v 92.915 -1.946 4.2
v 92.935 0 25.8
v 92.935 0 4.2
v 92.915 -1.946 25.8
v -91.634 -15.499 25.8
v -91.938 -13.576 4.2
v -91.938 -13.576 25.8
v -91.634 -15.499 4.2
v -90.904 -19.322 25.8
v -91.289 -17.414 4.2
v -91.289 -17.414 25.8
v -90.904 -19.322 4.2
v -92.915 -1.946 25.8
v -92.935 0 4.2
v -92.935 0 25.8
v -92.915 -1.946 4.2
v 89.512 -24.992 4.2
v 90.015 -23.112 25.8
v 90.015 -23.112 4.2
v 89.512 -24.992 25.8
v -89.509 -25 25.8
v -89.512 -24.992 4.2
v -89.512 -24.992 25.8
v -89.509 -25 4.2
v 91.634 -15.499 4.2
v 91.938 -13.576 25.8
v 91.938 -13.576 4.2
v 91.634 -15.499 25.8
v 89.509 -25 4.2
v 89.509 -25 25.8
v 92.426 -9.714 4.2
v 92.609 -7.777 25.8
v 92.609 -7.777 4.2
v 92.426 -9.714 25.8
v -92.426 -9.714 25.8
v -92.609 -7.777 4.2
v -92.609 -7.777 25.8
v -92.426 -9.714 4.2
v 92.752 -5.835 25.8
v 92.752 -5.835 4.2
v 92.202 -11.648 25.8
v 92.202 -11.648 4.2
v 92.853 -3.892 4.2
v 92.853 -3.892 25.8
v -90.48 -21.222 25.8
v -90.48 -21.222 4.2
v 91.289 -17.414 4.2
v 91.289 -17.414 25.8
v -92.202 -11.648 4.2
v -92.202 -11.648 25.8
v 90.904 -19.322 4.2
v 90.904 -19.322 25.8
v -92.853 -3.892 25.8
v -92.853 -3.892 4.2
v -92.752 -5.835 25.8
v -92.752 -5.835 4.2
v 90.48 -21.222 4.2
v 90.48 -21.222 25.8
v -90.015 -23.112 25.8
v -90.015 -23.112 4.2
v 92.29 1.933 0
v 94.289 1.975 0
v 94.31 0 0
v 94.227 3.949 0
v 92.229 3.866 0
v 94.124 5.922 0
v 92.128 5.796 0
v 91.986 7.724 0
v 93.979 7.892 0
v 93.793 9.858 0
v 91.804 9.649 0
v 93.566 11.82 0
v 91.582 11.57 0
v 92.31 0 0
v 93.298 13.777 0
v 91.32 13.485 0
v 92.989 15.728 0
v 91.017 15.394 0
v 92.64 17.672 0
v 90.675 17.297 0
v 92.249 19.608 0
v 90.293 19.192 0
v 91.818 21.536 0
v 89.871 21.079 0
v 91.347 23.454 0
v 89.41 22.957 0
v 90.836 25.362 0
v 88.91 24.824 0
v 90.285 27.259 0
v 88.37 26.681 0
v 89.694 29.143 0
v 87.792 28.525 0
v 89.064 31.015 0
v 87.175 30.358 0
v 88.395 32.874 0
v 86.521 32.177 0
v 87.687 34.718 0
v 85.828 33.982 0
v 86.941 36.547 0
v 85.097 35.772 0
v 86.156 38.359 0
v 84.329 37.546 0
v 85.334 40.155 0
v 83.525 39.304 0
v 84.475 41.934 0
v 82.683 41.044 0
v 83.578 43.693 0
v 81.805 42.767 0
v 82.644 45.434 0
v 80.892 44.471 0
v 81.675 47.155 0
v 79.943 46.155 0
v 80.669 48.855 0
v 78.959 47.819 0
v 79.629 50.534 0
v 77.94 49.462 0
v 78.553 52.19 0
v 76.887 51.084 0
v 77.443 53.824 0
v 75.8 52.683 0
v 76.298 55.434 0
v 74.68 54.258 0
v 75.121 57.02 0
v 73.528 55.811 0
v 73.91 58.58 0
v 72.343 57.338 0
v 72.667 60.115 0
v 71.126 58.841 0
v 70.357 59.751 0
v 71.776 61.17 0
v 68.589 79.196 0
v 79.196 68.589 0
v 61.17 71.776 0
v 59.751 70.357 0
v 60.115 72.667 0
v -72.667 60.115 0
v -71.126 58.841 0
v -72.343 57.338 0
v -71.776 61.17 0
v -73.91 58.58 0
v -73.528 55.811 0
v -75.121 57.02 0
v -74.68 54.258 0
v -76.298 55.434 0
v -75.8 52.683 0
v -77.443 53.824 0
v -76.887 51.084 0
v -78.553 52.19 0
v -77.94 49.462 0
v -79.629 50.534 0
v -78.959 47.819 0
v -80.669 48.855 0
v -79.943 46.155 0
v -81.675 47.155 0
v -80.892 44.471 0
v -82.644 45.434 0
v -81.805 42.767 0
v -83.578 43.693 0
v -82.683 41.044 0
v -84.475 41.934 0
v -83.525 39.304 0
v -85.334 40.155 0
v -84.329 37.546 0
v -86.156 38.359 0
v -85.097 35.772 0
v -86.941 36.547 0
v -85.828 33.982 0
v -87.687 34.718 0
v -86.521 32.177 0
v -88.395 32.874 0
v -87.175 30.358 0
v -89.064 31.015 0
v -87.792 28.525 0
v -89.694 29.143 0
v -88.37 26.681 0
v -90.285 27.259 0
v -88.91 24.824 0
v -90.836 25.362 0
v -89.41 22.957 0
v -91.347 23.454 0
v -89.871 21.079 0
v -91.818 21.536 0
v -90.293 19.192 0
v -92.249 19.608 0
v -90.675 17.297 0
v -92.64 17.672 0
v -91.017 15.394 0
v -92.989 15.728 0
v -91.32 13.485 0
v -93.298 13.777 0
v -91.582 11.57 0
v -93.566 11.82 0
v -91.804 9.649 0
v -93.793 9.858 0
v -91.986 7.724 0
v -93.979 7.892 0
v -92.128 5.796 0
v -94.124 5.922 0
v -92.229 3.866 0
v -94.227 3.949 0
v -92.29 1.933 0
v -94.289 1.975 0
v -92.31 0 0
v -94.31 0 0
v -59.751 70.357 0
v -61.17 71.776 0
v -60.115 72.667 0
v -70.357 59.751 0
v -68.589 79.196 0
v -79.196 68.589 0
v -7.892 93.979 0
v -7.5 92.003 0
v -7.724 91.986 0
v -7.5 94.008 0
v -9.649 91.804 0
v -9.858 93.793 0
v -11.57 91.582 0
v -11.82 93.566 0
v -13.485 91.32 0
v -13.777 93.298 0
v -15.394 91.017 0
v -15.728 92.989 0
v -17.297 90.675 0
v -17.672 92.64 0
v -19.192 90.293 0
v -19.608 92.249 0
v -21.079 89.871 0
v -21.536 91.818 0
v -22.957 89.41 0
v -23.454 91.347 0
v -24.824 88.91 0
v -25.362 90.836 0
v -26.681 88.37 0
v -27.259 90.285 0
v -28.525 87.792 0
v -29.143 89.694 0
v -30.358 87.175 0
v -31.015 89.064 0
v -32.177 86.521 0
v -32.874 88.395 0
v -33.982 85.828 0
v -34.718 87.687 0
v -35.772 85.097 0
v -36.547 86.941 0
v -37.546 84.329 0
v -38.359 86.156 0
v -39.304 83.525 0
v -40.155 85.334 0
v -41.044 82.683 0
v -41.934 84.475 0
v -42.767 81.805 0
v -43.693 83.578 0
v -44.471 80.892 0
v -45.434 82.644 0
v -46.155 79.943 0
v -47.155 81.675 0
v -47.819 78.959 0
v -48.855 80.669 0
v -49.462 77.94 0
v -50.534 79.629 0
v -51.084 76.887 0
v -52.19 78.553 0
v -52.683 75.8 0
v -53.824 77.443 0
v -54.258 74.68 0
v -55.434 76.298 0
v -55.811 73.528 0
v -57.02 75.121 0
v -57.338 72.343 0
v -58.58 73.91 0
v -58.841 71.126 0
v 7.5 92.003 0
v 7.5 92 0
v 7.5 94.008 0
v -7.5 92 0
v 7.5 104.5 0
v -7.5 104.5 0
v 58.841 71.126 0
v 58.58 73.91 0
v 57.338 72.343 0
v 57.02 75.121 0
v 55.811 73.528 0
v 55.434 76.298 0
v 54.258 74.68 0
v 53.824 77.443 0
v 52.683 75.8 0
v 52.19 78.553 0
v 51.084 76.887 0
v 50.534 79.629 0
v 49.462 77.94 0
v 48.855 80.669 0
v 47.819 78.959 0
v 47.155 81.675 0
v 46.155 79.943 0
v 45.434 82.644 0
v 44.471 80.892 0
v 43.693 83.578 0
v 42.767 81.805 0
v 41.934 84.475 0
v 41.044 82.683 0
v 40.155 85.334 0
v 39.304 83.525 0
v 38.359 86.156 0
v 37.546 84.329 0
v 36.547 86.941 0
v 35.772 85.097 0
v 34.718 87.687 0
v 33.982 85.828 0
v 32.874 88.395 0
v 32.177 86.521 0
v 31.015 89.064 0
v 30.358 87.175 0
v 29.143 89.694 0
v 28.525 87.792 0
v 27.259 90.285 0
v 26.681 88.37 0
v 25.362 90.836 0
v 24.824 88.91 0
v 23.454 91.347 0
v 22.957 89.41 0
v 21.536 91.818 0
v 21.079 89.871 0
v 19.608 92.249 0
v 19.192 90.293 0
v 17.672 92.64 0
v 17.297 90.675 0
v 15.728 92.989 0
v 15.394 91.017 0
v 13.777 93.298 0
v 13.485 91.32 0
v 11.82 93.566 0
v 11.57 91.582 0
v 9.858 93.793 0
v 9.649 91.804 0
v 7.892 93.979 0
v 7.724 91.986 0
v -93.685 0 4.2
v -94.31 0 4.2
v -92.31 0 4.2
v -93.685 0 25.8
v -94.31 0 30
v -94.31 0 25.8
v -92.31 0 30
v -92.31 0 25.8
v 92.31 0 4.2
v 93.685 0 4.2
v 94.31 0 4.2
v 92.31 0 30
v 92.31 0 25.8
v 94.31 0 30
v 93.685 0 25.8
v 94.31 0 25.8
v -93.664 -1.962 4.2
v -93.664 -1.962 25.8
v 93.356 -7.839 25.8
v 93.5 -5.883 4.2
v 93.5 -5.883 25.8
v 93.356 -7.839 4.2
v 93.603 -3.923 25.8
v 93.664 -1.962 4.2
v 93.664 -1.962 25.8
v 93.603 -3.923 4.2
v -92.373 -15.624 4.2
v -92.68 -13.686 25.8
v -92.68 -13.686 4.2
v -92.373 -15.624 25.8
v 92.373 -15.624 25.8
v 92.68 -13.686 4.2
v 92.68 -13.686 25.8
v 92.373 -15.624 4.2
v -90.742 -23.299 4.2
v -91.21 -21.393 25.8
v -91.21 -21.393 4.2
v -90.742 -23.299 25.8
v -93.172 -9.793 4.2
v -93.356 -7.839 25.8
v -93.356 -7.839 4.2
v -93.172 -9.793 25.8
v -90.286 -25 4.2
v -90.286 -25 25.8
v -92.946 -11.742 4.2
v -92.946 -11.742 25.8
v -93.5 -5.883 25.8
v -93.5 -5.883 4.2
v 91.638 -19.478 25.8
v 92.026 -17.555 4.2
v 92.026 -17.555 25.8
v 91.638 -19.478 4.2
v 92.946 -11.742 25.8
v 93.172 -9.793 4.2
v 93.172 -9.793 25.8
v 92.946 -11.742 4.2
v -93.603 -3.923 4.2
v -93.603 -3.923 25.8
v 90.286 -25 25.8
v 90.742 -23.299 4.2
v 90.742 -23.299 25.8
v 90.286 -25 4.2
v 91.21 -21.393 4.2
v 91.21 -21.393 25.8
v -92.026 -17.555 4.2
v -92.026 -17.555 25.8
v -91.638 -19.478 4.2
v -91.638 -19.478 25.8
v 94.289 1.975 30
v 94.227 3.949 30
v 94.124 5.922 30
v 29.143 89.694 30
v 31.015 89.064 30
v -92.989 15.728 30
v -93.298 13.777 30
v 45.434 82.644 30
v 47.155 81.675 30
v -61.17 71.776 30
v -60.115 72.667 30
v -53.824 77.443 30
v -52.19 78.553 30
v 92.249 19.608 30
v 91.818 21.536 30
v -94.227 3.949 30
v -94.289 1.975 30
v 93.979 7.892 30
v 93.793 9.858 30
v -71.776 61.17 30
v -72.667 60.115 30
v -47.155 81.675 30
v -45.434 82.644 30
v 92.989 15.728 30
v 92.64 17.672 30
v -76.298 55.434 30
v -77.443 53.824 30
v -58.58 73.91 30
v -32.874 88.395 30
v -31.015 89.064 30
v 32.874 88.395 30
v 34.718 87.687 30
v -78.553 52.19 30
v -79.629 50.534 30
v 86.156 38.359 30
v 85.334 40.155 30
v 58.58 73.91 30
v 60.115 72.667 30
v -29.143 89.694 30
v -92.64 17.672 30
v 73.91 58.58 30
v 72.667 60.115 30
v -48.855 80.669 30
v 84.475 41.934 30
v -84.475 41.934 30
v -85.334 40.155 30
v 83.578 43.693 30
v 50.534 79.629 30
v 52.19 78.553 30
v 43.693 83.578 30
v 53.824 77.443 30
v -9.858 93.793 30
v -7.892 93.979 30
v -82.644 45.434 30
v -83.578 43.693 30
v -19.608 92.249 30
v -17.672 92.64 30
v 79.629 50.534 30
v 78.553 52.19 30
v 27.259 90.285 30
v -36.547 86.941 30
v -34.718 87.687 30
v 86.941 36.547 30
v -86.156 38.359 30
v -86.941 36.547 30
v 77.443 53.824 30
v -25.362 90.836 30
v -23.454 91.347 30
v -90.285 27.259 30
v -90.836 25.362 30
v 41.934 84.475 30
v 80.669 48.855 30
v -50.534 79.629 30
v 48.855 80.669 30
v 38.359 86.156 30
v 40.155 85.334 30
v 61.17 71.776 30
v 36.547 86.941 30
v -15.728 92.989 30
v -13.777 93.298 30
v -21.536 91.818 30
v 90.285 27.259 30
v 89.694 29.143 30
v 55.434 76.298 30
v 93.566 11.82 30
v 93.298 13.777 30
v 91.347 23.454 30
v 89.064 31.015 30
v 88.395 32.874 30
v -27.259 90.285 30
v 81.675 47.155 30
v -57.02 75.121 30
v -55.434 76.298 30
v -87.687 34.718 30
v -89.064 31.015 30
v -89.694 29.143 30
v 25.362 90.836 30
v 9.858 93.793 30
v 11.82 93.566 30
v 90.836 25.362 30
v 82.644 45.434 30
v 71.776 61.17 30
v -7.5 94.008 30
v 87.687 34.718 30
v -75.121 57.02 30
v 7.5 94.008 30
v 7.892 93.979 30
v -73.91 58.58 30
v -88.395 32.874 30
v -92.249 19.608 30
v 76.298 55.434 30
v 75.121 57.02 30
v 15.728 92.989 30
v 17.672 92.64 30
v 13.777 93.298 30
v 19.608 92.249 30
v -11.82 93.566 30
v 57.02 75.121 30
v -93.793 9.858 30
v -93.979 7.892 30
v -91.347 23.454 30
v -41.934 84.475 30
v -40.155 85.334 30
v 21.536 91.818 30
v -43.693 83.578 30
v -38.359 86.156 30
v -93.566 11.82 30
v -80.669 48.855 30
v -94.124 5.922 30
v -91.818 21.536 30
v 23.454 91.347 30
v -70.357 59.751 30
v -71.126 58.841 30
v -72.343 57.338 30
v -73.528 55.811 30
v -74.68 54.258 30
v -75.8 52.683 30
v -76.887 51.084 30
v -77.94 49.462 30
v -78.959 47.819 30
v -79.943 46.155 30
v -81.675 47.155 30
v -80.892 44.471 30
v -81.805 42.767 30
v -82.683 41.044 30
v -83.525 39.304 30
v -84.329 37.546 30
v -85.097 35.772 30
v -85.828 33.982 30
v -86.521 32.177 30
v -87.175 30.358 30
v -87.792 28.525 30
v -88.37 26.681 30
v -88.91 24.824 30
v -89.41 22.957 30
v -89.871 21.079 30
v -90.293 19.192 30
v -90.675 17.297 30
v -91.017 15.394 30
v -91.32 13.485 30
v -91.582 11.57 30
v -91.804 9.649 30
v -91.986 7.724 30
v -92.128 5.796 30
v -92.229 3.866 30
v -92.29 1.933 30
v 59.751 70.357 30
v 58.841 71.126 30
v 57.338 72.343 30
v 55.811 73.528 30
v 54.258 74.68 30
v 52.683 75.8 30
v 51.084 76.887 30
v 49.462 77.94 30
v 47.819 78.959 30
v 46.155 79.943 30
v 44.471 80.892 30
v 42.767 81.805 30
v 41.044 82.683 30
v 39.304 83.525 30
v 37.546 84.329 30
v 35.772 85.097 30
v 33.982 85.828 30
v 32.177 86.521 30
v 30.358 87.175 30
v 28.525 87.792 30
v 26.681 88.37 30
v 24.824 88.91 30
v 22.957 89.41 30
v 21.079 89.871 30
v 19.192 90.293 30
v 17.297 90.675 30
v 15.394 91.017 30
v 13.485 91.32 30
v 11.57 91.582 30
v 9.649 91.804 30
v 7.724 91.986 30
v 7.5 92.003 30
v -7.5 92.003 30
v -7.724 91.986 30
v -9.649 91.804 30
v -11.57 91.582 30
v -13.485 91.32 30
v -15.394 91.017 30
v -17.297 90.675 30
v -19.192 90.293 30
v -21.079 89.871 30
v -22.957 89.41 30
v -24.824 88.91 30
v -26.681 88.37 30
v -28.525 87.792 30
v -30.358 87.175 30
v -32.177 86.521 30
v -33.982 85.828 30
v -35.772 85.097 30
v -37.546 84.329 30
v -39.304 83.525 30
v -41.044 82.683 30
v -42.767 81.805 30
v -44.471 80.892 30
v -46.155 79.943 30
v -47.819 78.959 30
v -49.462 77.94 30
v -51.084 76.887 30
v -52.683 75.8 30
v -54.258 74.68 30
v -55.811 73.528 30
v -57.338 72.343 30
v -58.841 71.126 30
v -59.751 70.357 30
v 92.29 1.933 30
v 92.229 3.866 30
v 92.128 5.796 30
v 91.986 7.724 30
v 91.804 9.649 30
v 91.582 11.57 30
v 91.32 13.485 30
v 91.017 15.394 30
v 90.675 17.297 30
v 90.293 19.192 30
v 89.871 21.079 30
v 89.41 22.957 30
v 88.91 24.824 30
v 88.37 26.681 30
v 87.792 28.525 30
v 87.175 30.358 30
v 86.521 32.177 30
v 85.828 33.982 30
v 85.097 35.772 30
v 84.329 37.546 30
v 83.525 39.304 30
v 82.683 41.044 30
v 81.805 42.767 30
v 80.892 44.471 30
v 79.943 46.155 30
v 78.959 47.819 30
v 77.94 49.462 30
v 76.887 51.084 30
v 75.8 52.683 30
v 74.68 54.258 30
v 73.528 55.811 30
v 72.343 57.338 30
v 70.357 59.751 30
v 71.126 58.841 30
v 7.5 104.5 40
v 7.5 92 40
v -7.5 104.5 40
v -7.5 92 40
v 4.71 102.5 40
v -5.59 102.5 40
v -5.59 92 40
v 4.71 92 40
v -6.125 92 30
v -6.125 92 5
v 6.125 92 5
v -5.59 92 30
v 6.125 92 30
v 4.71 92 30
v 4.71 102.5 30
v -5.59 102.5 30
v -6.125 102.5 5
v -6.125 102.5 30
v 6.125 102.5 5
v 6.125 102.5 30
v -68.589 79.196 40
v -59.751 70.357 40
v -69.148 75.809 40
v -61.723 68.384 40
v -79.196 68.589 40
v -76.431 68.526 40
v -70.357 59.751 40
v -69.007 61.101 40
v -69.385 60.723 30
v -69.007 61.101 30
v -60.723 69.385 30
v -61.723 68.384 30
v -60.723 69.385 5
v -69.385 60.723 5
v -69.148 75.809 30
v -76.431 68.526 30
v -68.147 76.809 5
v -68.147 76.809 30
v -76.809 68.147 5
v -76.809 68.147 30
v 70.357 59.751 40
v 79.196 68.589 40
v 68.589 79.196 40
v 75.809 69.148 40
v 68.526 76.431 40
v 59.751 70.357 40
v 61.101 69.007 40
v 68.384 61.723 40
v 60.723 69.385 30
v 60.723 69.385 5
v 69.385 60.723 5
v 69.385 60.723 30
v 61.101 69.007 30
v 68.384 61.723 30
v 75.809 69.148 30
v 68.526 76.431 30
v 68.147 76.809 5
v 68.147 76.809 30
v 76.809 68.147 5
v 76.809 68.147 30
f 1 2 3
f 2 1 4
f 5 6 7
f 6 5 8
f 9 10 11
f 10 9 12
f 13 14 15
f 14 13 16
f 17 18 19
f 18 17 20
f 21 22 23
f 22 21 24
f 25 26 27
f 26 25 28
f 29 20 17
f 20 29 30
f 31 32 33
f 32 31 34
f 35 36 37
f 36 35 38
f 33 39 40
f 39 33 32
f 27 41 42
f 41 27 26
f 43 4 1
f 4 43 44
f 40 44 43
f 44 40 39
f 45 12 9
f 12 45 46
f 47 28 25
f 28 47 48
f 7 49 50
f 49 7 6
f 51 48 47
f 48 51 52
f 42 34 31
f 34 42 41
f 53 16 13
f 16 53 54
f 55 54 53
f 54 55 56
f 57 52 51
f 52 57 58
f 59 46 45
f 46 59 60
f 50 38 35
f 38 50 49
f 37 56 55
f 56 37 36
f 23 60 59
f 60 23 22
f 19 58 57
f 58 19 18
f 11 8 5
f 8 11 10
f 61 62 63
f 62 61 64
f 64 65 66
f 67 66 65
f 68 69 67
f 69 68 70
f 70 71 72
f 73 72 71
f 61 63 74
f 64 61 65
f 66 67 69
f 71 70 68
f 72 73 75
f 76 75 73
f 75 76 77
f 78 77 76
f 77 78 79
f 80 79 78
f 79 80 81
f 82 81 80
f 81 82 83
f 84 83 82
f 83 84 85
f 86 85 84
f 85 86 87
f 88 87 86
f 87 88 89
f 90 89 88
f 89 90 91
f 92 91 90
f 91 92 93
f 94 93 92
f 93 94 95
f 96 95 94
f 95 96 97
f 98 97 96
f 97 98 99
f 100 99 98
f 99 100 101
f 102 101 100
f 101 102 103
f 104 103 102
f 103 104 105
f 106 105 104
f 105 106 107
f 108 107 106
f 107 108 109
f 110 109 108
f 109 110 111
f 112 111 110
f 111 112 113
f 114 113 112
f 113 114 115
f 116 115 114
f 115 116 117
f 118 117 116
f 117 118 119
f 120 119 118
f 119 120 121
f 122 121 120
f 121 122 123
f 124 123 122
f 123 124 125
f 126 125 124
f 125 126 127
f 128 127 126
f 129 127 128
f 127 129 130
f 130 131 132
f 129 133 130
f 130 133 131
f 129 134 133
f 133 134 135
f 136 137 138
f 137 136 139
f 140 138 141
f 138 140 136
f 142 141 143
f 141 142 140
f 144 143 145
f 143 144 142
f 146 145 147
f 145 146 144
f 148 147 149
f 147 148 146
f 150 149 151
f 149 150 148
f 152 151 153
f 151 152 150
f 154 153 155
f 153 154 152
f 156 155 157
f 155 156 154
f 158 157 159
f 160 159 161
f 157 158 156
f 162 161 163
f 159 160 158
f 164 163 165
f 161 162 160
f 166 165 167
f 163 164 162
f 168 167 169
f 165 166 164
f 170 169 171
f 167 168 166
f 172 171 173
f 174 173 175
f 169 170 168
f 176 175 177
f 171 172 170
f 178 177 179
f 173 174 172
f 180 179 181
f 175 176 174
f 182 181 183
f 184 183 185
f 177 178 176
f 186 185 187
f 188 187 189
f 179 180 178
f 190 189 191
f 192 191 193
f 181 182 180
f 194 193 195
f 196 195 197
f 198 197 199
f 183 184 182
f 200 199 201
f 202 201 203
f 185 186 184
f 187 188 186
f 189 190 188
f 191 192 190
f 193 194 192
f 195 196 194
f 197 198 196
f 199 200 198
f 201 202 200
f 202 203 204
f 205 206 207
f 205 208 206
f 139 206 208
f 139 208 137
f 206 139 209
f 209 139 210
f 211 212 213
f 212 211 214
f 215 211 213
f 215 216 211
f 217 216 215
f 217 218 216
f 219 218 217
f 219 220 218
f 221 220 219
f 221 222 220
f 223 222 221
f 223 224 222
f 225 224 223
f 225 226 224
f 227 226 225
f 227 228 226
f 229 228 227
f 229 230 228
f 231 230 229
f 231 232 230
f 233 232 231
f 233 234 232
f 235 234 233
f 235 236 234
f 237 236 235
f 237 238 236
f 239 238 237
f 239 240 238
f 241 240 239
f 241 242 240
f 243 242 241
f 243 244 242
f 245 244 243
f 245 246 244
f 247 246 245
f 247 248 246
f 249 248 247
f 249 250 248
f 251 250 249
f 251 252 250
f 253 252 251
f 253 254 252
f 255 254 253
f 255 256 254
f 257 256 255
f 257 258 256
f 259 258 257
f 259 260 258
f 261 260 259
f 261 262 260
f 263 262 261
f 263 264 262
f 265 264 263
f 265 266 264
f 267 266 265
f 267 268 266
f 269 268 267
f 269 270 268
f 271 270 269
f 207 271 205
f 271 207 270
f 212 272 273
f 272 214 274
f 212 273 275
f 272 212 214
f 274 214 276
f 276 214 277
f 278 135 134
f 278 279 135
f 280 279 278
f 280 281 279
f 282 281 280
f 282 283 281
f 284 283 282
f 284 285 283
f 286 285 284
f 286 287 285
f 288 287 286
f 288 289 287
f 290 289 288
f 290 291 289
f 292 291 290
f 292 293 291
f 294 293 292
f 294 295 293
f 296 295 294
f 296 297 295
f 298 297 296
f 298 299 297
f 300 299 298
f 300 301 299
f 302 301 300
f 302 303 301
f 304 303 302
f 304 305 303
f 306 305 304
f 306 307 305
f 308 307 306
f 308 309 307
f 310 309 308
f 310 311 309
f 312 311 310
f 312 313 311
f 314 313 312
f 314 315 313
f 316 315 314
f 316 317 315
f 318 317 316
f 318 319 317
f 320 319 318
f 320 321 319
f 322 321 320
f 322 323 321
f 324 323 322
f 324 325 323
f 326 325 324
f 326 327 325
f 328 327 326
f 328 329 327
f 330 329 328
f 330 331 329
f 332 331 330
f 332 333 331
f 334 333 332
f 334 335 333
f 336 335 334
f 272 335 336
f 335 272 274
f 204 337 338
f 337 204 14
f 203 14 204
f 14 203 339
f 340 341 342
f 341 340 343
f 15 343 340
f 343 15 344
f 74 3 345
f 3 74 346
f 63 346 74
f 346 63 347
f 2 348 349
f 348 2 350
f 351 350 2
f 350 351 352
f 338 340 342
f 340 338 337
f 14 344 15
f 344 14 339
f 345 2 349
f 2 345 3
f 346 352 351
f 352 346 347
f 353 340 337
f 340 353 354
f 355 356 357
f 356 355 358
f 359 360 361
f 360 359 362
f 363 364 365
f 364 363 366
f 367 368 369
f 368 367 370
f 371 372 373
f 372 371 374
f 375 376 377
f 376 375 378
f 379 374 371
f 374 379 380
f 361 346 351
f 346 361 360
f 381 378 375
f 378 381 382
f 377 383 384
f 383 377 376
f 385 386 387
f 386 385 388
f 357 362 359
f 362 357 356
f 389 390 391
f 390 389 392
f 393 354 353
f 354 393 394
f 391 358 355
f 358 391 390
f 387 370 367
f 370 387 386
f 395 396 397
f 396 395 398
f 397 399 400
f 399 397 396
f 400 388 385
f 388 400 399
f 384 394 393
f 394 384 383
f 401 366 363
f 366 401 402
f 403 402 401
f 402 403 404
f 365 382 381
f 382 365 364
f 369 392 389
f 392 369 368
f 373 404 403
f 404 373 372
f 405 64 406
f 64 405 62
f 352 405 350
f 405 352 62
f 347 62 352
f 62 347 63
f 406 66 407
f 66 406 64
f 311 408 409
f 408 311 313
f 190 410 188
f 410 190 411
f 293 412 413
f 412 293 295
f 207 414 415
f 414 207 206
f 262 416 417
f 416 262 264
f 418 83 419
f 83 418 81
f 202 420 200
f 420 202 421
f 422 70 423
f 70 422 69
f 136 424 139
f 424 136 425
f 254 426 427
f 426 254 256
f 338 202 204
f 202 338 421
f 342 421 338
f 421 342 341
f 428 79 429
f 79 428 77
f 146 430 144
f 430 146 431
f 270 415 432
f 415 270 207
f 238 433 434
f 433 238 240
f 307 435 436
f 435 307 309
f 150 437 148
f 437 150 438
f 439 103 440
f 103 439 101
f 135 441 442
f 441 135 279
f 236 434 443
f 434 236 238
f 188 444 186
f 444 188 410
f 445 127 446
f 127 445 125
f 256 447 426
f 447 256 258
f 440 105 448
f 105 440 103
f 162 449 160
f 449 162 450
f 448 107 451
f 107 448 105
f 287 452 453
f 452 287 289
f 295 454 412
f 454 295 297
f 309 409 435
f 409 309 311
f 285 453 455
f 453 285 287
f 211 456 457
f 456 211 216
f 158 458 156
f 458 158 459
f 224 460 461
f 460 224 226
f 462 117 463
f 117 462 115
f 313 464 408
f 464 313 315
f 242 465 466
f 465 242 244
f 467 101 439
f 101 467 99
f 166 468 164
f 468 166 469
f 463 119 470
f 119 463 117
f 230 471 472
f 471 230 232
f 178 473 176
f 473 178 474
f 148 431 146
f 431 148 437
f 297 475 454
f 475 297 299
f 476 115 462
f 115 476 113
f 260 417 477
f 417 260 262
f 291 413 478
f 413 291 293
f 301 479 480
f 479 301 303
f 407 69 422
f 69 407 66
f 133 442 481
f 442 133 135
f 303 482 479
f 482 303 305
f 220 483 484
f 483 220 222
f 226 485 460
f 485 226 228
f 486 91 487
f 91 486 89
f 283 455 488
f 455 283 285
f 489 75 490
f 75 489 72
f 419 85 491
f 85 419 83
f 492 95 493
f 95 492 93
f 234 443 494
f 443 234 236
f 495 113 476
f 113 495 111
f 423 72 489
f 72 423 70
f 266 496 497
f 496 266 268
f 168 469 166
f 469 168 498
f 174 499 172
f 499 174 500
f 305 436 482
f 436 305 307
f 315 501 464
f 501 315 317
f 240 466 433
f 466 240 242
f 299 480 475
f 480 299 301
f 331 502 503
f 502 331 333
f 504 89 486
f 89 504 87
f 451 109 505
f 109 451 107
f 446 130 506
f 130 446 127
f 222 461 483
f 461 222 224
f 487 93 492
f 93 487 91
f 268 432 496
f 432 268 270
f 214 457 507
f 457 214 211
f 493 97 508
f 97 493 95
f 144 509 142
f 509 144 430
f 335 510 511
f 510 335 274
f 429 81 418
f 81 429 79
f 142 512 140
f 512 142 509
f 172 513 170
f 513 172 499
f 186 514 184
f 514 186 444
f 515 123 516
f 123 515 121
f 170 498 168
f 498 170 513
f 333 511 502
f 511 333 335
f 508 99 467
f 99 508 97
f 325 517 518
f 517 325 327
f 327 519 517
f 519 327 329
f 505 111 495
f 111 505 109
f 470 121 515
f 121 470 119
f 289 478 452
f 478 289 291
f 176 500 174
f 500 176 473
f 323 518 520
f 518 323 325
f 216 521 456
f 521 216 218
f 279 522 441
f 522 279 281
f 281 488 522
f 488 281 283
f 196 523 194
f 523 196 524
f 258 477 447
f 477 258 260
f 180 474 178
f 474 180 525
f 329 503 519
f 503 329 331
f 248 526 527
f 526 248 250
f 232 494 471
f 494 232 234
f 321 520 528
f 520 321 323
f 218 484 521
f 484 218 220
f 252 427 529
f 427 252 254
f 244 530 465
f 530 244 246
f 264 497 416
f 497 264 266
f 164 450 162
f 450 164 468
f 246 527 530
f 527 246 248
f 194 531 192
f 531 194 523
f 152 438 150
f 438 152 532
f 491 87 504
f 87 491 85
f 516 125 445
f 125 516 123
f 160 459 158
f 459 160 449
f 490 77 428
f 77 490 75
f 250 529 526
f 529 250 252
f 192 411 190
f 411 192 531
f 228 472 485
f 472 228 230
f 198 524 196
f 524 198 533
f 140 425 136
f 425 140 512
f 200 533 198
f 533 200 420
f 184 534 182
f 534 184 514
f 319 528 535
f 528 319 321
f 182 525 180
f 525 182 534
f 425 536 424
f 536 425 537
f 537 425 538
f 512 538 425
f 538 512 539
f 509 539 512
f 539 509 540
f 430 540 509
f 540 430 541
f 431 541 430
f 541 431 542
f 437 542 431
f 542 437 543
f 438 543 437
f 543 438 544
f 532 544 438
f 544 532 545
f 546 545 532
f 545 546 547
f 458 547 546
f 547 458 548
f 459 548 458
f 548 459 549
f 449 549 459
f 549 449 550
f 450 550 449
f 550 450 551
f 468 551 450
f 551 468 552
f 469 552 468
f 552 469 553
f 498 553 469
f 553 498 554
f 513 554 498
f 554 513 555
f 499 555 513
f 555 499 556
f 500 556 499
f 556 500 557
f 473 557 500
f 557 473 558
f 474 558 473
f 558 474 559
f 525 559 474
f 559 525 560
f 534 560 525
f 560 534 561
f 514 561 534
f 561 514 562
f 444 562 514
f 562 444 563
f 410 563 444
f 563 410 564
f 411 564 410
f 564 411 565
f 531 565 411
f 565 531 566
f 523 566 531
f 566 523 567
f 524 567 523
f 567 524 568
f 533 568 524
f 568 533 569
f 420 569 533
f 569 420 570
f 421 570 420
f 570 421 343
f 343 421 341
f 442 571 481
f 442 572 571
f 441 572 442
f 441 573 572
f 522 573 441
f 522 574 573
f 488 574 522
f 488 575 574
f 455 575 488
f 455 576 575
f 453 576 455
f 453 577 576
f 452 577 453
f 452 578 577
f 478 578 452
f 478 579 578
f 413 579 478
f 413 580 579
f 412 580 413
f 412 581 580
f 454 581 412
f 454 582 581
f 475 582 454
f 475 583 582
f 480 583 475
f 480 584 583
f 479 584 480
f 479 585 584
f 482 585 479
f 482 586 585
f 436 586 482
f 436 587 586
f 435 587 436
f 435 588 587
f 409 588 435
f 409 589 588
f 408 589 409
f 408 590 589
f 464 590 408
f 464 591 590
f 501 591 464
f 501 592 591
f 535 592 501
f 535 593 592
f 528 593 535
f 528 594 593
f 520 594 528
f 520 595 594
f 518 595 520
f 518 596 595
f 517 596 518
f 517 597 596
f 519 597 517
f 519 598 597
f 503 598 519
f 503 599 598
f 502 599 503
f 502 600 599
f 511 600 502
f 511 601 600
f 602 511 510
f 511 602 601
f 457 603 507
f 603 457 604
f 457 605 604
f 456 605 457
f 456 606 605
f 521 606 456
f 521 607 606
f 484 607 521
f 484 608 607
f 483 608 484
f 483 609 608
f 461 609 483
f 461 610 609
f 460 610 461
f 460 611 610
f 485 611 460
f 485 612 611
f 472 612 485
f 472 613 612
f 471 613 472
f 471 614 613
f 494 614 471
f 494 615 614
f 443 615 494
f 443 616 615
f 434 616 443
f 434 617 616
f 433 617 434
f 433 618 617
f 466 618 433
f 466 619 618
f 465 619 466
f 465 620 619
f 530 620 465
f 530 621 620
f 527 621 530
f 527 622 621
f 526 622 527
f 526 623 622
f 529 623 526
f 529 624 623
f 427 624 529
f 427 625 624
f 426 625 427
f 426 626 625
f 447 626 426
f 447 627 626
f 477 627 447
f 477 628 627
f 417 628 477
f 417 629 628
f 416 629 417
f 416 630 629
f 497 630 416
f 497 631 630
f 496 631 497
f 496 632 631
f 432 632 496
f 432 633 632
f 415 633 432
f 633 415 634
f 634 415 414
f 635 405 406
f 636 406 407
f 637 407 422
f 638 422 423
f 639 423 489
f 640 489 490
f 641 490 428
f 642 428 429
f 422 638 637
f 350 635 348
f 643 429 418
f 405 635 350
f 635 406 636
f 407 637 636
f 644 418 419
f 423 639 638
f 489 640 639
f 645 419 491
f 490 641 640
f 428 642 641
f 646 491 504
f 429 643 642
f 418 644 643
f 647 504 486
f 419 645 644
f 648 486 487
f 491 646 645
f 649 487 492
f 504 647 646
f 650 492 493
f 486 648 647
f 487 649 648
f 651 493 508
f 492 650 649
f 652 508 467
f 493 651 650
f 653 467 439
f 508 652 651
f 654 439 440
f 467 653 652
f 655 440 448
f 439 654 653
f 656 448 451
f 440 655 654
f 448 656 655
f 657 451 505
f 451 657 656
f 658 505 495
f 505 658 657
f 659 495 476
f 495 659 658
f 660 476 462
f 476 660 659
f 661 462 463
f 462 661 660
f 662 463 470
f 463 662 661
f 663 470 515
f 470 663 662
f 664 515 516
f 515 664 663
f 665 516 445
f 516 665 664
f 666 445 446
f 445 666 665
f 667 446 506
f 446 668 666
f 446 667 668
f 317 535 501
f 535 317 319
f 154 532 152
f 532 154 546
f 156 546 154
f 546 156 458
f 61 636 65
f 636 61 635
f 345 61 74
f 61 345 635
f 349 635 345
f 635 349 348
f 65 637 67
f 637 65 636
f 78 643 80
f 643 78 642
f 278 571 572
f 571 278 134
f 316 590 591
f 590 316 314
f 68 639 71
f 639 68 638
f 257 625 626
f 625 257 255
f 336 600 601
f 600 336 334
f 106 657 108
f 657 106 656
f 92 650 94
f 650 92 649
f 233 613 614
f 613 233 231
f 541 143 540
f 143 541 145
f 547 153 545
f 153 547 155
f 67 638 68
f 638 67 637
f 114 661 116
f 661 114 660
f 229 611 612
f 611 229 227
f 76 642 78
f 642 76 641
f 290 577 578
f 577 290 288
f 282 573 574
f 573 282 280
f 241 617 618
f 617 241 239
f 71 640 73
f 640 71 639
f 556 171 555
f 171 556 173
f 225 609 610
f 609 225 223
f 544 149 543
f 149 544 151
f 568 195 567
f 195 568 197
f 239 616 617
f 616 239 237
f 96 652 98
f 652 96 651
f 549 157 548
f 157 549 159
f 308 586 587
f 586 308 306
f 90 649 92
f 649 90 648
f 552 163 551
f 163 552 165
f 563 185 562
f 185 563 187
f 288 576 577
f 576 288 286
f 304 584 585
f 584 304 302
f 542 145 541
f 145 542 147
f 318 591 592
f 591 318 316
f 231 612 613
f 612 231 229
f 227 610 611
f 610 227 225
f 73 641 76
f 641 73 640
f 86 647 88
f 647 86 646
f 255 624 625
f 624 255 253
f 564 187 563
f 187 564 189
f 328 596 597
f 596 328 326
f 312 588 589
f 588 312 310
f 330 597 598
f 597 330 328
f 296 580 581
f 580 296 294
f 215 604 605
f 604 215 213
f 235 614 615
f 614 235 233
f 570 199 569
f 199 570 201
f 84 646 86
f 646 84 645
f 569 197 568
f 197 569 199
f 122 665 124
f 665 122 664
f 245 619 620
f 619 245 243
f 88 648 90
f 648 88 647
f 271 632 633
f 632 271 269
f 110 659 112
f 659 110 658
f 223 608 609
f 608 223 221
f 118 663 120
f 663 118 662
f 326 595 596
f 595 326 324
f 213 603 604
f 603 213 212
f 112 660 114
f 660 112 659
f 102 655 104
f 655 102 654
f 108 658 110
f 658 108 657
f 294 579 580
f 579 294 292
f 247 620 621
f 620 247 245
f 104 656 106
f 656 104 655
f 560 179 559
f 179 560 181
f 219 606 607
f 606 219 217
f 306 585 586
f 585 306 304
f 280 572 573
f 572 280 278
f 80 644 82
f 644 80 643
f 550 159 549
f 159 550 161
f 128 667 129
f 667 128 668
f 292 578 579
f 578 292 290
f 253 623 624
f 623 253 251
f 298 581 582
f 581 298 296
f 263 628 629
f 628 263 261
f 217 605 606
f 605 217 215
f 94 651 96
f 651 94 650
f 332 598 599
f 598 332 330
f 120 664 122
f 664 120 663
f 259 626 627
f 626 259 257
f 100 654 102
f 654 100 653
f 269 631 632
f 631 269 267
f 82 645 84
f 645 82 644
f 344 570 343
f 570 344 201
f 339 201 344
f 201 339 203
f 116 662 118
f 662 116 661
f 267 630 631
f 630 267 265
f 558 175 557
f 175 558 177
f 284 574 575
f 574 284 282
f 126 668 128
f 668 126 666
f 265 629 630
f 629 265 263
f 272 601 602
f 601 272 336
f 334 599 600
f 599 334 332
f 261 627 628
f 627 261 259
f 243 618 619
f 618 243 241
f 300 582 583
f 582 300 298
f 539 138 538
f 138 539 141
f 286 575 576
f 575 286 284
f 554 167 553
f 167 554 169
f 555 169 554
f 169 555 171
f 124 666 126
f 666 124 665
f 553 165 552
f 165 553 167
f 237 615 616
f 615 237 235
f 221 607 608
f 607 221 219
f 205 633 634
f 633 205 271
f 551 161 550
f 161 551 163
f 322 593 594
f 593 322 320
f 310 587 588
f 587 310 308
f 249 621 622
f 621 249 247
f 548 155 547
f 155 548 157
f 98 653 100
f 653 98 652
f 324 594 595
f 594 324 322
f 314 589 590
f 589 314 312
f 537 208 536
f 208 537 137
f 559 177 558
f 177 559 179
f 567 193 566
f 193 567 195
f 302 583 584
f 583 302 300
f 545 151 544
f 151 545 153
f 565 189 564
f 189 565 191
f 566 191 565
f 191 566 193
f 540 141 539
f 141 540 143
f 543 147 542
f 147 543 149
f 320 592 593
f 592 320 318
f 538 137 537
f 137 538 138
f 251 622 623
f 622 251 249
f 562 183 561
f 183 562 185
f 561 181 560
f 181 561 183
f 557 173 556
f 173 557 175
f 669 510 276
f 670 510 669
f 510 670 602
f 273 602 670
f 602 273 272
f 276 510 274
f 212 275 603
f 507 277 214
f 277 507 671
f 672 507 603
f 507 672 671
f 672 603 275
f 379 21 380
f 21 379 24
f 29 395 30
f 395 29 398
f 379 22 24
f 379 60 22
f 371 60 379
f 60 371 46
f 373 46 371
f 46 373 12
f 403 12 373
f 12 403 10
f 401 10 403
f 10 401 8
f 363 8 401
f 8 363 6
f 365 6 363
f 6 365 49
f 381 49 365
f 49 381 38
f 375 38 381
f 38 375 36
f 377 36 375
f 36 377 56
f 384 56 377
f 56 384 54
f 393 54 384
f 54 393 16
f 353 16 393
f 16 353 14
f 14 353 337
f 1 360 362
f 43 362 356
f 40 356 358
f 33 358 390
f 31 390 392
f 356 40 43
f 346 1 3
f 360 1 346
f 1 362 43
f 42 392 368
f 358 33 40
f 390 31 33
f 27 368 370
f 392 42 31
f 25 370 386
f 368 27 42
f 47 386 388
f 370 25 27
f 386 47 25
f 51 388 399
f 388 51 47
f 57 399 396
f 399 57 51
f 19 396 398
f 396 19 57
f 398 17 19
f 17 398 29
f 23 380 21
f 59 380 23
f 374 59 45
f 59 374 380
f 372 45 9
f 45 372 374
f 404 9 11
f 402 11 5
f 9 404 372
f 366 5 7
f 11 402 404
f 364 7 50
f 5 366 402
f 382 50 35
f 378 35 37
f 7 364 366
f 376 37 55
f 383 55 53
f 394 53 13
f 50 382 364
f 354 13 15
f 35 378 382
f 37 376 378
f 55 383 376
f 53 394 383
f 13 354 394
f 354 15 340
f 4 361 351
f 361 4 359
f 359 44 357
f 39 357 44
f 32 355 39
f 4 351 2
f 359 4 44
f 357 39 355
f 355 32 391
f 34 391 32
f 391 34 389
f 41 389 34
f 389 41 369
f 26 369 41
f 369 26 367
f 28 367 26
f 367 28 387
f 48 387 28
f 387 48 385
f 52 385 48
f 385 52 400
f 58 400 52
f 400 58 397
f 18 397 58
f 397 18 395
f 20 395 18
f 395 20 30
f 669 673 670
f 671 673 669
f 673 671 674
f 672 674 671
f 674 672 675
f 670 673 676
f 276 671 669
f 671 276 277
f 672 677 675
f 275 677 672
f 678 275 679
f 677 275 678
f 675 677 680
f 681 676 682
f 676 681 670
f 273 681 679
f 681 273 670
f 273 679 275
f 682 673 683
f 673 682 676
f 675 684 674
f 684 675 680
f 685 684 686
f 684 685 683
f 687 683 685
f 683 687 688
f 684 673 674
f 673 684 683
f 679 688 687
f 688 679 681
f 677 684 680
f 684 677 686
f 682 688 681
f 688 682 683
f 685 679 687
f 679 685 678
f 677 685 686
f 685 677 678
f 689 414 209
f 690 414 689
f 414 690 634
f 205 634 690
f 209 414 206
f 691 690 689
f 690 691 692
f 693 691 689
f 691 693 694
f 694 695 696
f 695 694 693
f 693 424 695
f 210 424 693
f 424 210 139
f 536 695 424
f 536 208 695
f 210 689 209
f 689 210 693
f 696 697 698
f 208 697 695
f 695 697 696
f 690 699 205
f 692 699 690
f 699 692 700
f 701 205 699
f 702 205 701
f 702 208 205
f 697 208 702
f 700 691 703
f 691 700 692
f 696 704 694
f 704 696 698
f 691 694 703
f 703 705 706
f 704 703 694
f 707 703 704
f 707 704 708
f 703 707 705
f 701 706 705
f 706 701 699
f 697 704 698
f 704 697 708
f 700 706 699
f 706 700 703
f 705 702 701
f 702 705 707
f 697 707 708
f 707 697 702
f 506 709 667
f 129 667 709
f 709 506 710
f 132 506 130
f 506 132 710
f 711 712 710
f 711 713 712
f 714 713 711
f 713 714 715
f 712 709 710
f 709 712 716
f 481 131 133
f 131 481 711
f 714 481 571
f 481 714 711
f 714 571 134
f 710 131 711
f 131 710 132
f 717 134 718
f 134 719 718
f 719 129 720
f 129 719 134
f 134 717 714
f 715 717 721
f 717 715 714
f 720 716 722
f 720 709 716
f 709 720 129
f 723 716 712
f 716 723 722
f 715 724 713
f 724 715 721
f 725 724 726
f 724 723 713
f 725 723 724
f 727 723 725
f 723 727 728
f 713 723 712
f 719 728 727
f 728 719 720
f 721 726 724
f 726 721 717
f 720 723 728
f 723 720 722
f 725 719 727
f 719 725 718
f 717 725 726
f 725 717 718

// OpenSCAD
dring=184.62;
//58cm as circumference
resolution=300;

difference(){
    cylinder(d=dring+4,h=30, $fn=resolution);
    cylinder(d=dring,h=40, $fn=resolution);
    translate([-7.5,dring/2-0.31,0])cube([1.5*10,1*10,5*10]);
    rotate([0,0,45])translate([-7.5,dring/2-0.31,0])cube([1.5*10,1*10,5*10]);
    rotate([0,0,-45])translate([-7.5,dring/2-0.31,0])cube([1.5*10,1*10,5*10]);
    translate([-100,-105,0])cube([200,80,60]);
    
    union(){
        difference(){
        union(){
            cylinder(d=dring+1.25,h=40, $fn=resolution);
        }
        translate([-200,0,0])cube([400,300,300]);
    }
    }
    
    union(){
        difference(){
        union(){
            difference(){
            cylinder(d=dring+4,h=40, $fn=resolution);
            cylinder(d=dring+2.75,h=40, $fn=resolution);
            }
        }
        translate([-200,0,0])cube([400,300,300]);
    }
    }
    
    translate([-100,-25,0])cube([300,25,4.2]);
    translate([-100,-25,25.8])cube([300,25,4.2]);
    
    /*
    translate([7.5,dring/2,0])cube([10,10,100],center=true);
    translate([-7.5,dring/2,0])cube([10,10,100],center=true);
    translate([0,-10,0])cube([100,90,100],center=true);
    translate([-23,dring/2,0])cube([30,40,100],center=true);
    translate([23,dring/2,0])cube([30,40,100],center=true);
    */
       
    }
    
 
translate([-7.5,dring/2-0.31,0])scale([10,10,10]){    
 difference(){
    cube([1.5,0.9+0.35,3+1]);
     //used to be 0.092
    translate([.135+0.092-0.036,0,2])cube([1.03,.7+0.35,2+1]);
    translate([.375-0.2375,0,0.5])cube([1.225,.7+0.35,1.5+1]);
}
}

rotate([0,0,45])translate([-7.5,dring/2-0.31,0])scale([10,10,10]){    
 difference(){
    cube([1.5,0.9+0.35,3+1]);
    translate([.135+0.092-0.036,0,2])cube([1.03,.7+0.35,2+1]);
    translate([.375-0.2375,0,0.5])cube([1.225,.7+0.35,1.5+1]);
}
}

rotate([0,0,-45])translate([-7.5,dring/2-0.31,0])scale([10,10,10]){    
 difference(){
    cube([1.5,0.9+0.35,3+1]);
    translate([.135+0.092-0.036,0,2])cube([1.03,.7+0.35,2+1]);
    translate([.375-0.2375,0,0.5])cube([1.225,.7+0.35,1.5+1]);
}
}
